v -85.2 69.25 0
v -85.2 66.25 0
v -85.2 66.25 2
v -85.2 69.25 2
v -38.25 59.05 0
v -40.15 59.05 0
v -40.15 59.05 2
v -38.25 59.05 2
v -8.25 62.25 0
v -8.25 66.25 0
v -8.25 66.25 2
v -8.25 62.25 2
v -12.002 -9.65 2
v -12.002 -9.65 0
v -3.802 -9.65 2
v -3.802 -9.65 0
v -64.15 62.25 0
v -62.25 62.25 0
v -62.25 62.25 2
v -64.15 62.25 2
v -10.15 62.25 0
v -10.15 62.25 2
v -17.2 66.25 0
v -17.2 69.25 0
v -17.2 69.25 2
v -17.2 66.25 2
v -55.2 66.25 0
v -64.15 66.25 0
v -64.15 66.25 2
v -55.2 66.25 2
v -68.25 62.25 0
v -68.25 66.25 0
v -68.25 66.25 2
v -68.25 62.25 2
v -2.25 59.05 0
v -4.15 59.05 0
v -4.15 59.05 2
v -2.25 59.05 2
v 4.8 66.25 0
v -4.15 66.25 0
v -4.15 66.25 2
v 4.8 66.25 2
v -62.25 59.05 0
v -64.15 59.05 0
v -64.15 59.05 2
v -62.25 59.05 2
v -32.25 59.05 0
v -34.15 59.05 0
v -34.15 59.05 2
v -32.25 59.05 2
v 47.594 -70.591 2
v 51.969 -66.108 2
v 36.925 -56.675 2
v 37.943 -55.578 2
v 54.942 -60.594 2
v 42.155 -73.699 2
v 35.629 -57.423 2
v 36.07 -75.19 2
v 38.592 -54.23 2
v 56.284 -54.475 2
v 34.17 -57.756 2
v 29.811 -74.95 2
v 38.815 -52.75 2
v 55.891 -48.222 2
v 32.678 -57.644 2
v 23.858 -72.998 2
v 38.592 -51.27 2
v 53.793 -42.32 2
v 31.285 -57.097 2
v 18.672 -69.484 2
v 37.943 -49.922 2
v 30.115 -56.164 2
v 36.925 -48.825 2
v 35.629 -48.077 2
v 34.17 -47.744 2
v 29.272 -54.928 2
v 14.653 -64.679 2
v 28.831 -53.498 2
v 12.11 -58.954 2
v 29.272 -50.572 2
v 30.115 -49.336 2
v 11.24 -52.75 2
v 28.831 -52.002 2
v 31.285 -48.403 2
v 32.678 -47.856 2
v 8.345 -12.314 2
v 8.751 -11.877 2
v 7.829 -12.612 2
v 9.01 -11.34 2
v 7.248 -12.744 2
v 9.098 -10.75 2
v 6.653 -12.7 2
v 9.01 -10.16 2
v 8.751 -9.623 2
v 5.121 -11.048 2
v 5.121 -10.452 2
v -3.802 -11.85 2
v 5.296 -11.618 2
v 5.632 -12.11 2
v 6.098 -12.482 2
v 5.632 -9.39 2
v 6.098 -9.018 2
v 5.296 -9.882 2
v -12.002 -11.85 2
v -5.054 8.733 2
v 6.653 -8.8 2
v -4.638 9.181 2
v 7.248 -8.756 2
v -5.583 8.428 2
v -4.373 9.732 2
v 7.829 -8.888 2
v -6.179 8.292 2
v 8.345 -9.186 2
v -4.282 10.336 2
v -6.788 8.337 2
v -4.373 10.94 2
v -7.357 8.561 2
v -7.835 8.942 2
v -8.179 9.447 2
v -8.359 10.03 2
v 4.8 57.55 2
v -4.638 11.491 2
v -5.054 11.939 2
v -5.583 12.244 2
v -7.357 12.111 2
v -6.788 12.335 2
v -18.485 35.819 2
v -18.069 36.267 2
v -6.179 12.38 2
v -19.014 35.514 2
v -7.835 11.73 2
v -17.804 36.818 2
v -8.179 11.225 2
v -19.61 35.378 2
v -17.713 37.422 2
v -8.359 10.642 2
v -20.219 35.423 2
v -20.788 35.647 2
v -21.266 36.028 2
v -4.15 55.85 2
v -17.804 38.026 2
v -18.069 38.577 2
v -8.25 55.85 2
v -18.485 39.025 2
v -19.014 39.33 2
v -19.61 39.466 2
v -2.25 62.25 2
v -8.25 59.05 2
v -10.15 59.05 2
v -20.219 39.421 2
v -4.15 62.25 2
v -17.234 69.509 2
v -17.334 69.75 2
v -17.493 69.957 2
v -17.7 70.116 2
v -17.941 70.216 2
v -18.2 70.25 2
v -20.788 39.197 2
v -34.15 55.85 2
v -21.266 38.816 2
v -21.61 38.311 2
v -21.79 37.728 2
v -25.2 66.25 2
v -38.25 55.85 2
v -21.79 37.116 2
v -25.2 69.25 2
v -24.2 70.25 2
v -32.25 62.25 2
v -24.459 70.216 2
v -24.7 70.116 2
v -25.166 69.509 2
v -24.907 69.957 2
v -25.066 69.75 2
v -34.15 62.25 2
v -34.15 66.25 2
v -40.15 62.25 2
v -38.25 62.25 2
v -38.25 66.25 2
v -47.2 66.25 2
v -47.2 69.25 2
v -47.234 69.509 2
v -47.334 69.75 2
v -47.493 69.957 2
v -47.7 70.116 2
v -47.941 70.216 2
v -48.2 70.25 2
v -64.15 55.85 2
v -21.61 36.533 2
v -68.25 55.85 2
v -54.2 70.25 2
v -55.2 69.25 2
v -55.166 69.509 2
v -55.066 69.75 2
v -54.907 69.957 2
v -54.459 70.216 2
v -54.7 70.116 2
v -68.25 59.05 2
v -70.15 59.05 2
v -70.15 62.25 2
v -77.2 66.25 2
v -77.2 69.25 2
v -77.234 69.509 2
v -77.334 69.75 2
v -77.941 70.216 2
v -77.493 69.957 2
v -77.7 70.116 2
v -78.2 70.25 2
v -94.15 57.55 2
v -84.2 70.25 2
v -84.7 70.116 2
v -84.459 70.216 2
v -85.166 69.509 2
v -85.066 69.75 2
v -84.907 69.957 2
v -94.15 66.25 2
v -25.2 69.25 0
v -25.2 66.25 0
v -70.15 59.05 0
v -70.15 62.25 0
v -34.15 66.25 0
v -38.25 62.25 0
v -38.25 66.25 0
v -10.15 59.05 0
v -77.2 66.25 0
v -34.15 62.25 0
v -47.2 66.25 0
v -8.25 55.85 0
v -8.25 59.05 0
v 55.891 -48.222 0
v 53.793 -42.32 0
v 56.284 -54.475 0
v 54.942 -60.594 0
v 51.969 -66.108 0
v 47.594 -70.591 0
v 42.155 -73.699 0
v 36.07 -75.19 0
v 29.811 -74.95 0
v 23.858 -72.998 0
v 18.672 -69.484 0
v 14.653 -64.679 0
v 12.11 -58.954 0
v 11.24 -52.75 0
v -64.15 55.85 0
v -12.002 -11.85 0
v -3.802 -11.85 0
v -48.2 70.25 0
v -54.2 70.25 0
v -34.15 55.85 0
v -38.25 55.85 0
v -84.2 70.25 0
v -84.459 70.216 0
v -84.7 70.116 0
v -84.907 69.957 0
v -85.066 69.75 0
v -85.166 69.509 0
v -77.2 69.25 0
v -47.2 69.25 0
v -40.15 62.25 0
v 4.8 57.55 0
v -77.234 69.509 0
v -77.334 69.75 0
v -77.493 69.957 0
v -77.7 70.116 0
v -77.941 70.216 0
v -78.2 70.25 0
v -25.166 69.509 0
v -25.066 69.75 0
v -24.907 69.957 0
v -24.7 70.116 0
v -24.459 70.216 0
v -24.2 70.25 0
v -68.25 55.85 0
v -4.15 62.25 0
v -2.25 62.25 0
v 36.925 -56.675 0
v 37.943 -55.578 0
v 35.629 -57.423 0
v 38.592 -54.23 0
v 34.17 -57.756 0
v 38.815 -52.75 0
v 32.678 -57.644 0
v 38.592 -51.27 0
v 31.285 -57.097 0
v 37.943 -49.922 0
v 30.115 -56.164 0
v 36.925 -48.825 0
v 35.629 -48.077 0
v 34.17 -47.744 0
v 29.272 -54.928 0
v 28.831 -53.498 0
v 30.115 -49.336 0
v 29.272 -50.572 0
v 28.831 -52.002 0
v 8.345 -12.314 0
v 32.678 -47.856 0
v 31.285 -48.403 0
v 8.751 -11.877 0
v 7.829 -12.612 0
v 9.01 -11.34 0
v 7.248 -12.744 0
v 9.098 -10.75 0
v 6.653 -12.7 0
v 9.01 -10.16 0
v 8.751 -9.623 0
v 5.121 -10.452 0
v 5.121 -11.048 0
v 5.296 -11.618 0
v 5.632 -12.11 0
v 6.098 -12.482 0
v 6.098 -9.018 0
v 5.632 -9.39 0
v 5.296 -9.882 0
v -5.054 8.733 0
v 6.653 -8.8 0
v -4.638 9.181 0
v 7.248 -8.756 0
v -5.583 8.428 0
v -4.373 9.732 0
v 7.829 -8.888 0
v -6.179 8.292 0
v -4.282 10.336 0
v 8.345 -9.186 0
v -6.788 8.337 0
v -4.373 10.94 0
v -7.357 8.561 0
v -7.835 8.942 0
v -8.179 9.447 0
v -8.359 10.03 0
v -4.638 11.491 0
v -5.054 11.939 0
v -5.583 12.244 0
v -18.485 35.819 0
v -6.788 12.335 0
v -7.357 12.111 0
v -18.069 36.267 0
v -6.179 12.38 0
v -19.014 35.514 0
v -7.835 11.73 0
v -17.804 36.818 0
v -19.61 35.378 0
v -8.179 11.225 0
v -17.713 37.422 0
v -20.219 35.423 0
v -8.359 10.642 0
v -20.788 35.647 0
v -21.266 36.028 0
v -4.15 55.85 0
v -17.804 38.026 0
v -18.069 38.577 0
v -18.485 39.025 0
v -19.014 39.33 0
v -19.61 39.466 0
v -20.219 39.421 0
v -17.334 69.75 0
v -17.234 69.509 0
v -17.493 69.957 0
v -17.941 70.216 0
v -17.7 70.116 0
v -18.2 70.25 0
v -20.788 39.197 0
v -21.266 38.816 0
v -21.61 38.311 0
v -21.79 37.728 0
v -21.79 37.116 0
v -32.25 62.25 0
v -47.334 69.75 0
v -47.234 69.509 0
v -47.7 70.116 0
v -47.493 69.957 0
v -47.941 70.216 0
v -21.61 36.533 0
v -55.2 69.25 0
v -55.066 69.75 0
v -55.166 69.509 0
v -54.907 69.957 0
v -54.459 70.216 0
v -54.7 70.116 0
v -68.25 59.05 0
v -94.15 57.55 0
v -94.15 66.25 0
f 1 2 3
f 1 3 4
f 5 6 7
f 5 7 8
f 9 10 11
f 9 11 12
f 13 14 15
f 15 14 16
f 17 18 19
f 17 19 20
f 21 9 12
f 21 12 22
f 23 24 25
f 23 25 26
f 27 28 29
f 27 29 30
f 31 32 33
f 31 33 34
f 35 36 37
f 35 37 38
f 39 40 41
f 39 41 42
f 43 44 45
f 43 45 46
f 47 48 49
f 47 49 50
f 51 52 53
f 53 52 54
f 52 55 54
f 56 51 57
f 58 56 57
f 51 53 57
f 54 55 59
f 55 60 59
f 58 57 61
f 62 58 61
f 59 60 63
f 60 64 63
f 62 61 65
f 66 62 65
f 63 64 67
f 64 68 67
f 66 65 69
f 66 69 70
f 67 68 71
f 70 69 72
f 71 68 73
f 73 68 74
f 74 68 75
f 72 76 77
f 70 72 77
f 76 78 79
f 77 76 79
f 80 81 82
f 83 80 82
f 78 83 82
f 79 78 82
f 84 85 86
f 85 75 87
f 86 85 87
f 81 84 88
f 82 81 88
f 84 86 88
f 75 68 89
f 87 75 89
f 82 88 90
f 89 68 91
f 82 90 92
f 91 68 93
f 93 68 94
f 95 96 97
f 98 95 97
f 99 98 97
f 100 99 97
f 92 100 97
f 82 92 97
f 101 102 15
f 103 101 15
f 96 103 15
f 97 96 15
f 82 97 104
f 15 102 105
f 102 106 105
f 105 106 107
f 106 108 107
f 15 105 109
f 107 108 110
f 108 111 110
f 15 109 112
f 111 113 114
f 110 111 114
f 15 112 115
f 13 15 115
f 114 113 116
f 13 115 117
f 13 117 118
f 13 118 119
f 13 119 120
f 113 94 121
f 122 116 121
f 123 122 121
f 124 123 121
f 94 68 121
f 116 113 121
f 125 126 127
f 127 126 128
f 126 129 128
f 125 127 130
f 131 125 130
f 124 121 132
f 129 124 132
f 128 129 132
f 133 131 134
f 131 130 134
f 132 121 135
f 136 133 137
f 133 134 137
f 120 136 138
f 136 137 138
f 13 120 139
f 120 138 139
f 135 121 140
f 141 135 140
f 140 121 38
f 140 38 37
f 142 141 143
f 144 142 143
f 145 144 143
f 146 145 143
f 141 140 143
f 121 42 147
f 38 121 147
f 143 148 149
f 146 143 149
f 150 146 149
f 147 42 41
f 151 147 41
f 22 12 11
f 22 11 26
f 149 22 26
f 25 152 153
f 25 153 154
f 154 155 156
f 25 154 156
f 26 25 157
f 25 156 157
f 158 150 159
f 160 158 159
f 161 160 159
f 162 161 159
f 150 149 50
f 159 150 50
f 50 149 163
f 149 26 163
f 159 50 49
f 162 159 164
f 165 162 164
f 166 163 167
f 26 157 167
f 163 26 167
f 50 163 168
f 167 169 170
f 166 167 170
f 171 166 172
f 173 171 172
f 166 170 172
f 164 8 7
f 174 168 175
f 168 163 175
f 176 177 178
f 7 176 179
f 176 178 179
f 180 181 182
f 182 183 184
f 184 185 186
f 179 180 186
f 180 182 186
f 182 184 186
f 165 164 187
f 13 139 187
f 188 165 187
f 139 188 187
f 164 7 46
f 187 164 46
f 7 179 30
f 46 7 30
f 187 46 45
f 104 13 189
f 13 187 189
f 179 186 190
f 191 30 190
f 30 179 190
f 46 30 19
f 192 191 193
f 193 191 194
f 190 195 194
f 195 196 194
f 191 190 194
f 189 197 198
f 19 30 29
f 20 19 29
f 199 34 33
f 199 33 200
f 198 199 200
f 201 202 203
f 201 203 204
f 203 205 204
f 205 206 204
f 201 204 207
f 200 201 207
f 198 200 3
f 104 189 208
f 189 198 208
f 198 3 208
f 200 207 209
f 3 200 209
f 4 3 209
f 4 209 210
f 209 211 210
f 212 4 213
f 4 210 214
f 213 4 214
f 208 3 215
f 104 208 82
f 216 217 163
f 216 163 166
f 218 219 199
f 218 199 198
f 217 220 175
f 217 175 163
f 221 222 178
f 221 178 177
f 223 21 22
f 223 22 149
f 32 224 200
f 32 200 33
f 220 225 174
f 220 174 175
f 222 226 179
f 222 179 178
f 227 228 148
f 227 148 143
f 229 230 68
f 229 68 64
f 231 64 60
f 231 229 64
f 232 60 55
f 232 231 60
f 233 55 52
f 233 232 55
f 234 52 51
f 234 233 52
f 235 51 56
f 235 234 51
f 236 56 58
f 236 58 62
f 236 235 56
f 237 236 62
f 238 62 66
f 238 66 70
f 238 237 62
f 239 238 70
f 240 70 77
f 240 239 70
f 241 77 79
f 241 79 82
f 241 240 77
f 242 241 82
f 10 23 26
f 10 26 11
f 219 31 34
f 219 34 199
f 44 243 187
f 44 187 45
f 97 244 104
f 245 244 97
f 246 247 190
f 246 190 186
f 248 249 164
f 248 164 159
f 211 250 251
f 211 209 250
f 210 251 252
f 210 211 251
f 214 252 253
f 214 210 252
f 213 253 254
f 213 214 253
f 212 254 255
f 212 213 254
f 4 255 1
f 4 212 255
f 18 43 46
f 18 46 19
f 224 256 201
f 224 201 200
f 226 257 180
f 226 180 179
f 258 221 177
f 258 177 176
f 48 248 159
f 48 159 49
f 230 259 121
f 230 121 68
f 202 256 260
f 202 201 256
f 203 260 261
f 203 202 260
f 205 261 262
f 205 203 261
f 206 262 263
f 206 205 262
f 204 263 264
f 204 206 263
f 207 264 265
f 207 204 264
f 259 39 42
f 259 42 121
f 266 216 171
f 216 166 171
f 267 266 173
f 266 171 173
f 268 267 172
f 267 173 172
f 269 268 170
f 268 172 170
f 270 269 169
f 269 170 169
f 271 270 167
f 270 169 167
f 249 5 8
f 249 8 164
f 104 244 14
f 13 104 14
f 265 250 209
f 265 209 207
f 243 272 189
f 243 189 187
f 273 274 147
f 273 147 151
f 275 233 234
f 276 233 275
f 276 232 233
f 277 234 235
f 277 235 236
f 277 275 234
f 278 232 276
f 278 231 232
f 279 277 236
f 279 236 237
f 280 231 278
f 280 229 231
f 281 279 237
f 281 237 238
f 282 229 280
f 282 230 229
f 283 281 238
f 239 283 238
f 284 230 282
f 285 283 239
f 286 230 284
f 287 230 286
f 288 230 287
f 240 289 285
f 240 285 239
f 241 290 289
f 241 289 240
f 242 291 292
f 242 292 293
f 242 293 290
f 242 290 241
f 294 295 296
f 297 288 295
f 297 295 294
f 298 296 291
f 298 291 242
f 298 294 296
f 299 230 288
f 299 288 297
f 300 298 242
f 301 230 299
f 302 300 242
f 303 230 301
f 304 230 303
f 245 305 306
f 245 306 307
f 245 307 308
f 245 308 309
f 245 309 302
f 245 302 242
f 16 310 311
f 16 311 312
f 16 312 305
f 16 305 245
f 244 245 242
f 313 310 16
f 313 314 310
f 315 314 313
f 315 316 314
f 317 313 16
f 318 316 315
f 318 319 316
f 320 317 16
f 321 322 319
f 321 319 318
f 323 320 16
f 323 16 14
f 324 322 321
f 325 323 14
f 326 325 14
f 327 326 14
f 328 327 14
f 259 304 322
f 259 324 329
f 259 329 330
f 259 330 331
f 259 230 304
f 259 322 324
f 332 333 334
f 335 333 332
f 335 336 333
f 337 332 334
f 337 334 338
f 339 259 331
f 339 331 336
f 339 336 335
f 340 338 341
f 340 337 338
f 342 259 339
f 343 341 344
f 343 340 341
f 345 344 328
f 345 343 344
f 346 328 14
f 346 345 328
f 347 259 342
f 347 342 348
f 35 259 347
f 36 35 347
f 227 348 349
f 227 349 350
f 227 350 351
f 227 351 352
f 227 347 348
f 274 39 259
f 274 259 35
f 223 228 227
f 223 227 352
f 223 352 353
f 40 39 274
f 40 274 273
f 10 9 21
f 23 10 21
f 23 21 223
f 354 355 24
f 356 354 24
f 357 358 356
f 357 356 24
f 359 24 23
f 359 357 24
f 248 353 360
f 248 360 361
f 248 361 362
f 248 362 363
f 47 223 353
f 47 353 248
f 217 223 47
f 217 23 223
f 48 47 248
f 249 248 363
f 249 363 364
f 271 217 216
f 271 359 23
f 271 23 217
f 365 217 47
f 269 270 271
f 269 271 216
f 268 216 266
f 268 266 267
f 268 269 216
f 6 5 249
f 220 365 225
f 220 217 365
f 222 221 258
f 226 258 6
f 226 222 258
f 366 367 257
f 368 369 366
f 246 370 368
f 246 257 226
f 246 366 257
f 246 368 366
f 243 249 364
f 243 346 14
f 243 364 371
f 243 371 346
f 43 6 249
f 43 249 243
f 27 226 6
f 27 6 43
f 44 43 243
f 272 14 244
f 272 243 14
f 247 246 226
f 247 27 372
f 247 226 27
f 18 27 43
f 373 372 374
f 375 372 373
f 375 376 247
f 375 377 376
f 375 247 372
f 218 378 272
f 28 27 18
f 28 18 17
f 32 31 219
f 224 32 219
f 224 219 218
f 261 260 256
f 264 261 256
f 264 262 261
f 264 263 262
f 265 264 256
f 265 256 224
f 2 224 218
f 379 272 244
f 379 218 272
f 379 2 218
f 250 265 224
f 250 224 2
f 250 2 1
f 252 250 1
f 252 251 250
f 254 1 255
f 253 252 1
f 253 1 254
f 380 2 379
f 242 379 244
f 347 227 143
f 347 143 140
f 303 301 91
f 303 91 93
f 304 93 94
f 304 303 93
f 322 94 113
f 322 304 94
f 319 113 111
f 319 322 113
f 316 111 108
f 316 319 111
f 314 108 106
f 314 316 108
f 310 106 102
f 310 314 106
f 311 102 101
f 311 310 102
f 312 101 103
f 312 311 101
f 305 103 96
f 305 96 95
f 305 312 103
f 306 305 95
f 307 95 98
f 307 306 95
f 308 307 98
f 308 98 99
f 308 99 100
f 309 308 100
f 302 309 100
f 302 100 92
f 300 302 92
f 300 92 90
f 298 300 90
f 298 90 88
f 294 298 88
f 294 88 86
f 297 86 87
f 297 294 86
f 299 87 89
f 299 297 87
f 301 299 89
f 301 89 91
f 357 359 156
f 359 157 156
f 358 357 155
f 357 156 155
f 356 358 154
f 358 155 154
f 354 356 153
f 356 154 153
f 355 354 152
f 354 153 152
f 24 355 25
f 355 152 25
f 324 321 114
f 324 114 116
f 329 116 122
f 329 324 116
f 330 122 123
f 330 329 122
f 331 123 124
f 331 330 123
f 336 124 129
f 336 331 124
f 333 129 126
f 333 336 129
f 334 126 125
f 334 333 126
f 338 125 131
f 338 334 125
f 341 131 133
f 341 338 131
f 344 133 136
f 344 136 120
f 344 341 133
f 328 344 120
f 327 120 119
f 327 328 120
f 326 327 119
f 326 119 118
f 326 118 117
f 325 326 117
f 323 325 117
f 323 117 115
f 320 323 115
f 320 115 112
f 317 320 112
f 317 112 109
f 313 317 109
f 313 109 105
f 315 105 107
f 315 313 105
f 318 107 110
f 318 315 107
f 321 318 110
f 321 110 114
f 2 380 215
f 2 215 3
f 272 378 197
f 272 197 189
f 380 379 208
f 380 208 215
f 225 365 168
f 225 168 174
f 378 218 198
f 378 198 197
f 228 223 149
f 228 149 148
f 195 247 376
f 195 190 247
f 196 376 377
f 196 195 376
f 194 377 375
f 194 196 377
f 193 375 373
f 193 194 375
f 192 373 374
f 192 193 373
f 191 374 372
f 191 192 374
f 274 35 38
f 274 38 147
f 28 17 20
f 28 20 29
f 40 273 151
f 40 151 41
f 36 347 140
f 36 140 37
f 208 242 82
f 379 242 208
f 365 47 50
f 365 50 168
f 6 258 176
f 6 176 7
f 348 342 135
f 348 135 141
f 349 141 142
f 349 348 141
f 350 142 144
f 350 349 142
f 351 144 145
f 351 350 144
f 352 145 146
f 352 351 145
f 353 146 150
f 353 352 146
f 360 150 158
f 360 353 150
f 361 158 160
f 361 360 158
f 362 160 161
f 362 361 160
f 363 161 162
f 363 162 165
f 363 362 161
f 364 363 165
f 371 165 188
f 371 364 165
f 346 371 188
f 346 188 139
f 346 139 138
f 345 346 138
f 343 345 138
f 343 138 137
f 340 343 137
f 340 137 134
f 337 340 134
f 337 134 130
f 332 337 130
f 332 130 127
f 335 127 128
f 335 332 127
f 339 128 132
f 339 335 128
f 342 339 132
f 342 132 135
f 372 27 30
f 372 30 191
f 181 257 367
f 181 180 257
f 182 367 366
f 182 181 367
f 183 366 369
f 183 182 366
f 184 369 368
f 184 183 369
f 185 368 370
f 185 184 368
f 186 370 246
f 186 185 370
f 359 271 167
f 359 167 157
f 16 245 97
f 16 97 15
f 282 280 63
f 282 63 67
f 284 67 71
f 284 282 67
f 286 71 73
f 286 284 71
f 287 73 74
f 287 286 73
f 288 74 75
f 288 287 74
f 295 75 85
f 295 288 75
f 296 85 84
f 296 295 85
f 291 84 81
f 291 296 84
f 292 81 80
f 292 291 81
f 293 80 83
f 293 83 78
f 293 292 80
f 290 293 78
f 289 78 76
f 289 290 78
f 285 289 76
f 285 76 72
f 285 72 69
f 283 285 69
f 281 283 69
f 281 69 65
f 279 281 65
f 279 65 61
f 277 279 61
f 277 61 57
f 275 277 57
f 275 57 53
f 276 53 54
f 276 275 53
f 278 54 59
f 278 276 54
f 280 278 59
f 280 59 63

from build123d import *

# Parameters (mm, degrees)
SKETCH_1_R      = 2
SKETCH_1_R_2    = 5.02
SKETCH_1_R_3    = 2.05
SKETCH_1_W      = 8.2
SKETCH_1_H      = 2.2
EXTRUDE_1_DEPTH = 2
FILLET_1_R      = 1


with BuildPart() as part:
    # 草图1 → 凸台-拉伸1 (new body)
    with BuildSketch(Plane.XY):
        with BuildLine():
            Line((-38.25, 66.25), (-38.25, 62.25))
            Line((-38.25, 62.25), (-40.15, 62.25))
            Line((-40.15, 62.25), (-40.15, 59.05))
            Line((-40.15, 59.05), (-38.25, 59.05))
            Line((-38.25, 59.05), (-38.25, 55.85))
            Line((-38.25, 55.85), (-34.15, 55.85))
            Line((-34.15, 55.85), (-34.15, 59.05))
            Line((-34.15, 59.05), (-32.25, 59.05))
            Line((-32.25, 59.05), (-32.25, 62.25))
            Line((-32.25, 62.25), (-34.15, 62.25))
            Line((-34.15, 62.25), (-34.15, 66.25))
            Line((-34.15, 66.25), (-25.2, 66.25))
            Line((-25.2, 66.25), (-25.2, 70.25))
            Line((-25.2, 70.25), (-17.2, 70.25))
            Line((-17.2, 70.25), (-17.2, 66.25))
            Line((-17.2, 66.25), (-8.25, 66.25))
            Line((-8.25, 66.25), (-8.25, 62.25))
            Line((-8.25, 62.25), (-10.15, 62.25))
            Line((-10.15, 62.25), (-10.15, 59.05))
            Line((-10.15, 59.05), (-8.25, 59.05))
            Line((-8.25, 59.05), (-8.25, 55.85))
            Line((-8.25, 55.85), (-4.15, 55.85))
            Line((-4.15, 55.85), (-4.15, 59.05))
            Line((-4.15, 59.05), (-2.25, 59.05))
            Line((-2.25, 59.05), (-2.25, 62.25))
            Line((-2.25, 62.25), (-4.15, 62.25))
            Line((-4.15, 62.25), (-4.15, 66.25))
            Line((-4.15, 66.25), (4.8, 66.25))
            Line((4.8, 66.25), (4.8, 57.55))
            Line((4.8, 57.55), (53.793343317, -42.319549886))
            ThreePointArc((53.793343317, -42.319549886), (39.164608528, -74.656513398), (11.24, -52.75))
            Line((11.24, -52.75), (-94.15, 57.55))
            Line((-94.15, 57.55), (-94.15, 66.25))
            Line((-94.15, 66.25), (-85.2, 66.25))
            Line((-85.2, 66.25), (-85.2, 70.25))
            Line((-85.2, 70.25), (-77.2, 70.25))
            Line((-77.2, 70.25), (-77.2, 66.25))
            Line((-77.2, 66.25), (-68.25, 66.25))
            Line((-68.25, 66.25), (-68.25, 62.25))
            Line((-68.25, 62.25), (-70.15, 62.25))
            Line((-70.15, 62.25), (-70.15, 59.05))
            Line((-70.15, 59.05), (-68.25, 59.05))
            Line((-68.25, 59.05), (-68.25, 55.85))
            Line((-68.25, 55.85), (-64.15, 55.85))
            Line((-64.15, 55.85), (-64.15, 59.05))
            Line((-64.15, 59.05), (-62.25, 59.05))
            Line((-62.25, 59.05), (-62.25, 62.25))
            Line((-62.25, 62.25), (-64.15, 62.25))
            Line((-64.15, 62.25), (-64.15, 66.25))
            Line((-64.15, 66.25), (-55.2, 66.25))
            Line((-55.2, 66.25), (-55.2, 70.25))
            Line((-55.2, 70.25), (-47.2, 70.25))
            Line((-47.2, 70.25), (-47.2, 66.25))
            Line((-47.2, 66.25), (-38.25, 66.25))
        make_face()
        with Locations((7.098407643, -10.75)):
            Circle(SKETCH_1_R, mode=Mode.SUBTRACT)
        with Locations((33.795, -52.75)):
            Circle(SKETCH_1_R_2, mode=Mode.SUBTRACT)
        with Locations((-6.332168895, 10.336005166)):
            Circle(SKETCH_1_R_3, mode=Mode.SUBTRACT)
        with Locations((-19.762745434, 37.422010331)):
            Circle(SKETCH_1_R_3, mode=Mode.SUBTRACT)
        with Locations((-7.901592357, -10.75)):
            Rectangle(SKETCH_1_W, SKETCH_1_H, mode=Mode.SUBTRACT)
    extrude(amount=EXTRUDE_1_DEPTH)

    # 圆角1
    fillet_1_edges = [part.edges().sort_by_distance(p)[0] for p in [
        (-25.2, 70.25, 1),
        (-17.2, 70.25, 1),
        (-85.2, 70.25, 1),
        (-77.2, 70.25, 1),
        (-55.2, 70.25, 1),
        (-47.2, 70.25, 1),
    ]]
    fillet(fillet_1_edges, radius=FILLET_1_R)


solid = part.part
